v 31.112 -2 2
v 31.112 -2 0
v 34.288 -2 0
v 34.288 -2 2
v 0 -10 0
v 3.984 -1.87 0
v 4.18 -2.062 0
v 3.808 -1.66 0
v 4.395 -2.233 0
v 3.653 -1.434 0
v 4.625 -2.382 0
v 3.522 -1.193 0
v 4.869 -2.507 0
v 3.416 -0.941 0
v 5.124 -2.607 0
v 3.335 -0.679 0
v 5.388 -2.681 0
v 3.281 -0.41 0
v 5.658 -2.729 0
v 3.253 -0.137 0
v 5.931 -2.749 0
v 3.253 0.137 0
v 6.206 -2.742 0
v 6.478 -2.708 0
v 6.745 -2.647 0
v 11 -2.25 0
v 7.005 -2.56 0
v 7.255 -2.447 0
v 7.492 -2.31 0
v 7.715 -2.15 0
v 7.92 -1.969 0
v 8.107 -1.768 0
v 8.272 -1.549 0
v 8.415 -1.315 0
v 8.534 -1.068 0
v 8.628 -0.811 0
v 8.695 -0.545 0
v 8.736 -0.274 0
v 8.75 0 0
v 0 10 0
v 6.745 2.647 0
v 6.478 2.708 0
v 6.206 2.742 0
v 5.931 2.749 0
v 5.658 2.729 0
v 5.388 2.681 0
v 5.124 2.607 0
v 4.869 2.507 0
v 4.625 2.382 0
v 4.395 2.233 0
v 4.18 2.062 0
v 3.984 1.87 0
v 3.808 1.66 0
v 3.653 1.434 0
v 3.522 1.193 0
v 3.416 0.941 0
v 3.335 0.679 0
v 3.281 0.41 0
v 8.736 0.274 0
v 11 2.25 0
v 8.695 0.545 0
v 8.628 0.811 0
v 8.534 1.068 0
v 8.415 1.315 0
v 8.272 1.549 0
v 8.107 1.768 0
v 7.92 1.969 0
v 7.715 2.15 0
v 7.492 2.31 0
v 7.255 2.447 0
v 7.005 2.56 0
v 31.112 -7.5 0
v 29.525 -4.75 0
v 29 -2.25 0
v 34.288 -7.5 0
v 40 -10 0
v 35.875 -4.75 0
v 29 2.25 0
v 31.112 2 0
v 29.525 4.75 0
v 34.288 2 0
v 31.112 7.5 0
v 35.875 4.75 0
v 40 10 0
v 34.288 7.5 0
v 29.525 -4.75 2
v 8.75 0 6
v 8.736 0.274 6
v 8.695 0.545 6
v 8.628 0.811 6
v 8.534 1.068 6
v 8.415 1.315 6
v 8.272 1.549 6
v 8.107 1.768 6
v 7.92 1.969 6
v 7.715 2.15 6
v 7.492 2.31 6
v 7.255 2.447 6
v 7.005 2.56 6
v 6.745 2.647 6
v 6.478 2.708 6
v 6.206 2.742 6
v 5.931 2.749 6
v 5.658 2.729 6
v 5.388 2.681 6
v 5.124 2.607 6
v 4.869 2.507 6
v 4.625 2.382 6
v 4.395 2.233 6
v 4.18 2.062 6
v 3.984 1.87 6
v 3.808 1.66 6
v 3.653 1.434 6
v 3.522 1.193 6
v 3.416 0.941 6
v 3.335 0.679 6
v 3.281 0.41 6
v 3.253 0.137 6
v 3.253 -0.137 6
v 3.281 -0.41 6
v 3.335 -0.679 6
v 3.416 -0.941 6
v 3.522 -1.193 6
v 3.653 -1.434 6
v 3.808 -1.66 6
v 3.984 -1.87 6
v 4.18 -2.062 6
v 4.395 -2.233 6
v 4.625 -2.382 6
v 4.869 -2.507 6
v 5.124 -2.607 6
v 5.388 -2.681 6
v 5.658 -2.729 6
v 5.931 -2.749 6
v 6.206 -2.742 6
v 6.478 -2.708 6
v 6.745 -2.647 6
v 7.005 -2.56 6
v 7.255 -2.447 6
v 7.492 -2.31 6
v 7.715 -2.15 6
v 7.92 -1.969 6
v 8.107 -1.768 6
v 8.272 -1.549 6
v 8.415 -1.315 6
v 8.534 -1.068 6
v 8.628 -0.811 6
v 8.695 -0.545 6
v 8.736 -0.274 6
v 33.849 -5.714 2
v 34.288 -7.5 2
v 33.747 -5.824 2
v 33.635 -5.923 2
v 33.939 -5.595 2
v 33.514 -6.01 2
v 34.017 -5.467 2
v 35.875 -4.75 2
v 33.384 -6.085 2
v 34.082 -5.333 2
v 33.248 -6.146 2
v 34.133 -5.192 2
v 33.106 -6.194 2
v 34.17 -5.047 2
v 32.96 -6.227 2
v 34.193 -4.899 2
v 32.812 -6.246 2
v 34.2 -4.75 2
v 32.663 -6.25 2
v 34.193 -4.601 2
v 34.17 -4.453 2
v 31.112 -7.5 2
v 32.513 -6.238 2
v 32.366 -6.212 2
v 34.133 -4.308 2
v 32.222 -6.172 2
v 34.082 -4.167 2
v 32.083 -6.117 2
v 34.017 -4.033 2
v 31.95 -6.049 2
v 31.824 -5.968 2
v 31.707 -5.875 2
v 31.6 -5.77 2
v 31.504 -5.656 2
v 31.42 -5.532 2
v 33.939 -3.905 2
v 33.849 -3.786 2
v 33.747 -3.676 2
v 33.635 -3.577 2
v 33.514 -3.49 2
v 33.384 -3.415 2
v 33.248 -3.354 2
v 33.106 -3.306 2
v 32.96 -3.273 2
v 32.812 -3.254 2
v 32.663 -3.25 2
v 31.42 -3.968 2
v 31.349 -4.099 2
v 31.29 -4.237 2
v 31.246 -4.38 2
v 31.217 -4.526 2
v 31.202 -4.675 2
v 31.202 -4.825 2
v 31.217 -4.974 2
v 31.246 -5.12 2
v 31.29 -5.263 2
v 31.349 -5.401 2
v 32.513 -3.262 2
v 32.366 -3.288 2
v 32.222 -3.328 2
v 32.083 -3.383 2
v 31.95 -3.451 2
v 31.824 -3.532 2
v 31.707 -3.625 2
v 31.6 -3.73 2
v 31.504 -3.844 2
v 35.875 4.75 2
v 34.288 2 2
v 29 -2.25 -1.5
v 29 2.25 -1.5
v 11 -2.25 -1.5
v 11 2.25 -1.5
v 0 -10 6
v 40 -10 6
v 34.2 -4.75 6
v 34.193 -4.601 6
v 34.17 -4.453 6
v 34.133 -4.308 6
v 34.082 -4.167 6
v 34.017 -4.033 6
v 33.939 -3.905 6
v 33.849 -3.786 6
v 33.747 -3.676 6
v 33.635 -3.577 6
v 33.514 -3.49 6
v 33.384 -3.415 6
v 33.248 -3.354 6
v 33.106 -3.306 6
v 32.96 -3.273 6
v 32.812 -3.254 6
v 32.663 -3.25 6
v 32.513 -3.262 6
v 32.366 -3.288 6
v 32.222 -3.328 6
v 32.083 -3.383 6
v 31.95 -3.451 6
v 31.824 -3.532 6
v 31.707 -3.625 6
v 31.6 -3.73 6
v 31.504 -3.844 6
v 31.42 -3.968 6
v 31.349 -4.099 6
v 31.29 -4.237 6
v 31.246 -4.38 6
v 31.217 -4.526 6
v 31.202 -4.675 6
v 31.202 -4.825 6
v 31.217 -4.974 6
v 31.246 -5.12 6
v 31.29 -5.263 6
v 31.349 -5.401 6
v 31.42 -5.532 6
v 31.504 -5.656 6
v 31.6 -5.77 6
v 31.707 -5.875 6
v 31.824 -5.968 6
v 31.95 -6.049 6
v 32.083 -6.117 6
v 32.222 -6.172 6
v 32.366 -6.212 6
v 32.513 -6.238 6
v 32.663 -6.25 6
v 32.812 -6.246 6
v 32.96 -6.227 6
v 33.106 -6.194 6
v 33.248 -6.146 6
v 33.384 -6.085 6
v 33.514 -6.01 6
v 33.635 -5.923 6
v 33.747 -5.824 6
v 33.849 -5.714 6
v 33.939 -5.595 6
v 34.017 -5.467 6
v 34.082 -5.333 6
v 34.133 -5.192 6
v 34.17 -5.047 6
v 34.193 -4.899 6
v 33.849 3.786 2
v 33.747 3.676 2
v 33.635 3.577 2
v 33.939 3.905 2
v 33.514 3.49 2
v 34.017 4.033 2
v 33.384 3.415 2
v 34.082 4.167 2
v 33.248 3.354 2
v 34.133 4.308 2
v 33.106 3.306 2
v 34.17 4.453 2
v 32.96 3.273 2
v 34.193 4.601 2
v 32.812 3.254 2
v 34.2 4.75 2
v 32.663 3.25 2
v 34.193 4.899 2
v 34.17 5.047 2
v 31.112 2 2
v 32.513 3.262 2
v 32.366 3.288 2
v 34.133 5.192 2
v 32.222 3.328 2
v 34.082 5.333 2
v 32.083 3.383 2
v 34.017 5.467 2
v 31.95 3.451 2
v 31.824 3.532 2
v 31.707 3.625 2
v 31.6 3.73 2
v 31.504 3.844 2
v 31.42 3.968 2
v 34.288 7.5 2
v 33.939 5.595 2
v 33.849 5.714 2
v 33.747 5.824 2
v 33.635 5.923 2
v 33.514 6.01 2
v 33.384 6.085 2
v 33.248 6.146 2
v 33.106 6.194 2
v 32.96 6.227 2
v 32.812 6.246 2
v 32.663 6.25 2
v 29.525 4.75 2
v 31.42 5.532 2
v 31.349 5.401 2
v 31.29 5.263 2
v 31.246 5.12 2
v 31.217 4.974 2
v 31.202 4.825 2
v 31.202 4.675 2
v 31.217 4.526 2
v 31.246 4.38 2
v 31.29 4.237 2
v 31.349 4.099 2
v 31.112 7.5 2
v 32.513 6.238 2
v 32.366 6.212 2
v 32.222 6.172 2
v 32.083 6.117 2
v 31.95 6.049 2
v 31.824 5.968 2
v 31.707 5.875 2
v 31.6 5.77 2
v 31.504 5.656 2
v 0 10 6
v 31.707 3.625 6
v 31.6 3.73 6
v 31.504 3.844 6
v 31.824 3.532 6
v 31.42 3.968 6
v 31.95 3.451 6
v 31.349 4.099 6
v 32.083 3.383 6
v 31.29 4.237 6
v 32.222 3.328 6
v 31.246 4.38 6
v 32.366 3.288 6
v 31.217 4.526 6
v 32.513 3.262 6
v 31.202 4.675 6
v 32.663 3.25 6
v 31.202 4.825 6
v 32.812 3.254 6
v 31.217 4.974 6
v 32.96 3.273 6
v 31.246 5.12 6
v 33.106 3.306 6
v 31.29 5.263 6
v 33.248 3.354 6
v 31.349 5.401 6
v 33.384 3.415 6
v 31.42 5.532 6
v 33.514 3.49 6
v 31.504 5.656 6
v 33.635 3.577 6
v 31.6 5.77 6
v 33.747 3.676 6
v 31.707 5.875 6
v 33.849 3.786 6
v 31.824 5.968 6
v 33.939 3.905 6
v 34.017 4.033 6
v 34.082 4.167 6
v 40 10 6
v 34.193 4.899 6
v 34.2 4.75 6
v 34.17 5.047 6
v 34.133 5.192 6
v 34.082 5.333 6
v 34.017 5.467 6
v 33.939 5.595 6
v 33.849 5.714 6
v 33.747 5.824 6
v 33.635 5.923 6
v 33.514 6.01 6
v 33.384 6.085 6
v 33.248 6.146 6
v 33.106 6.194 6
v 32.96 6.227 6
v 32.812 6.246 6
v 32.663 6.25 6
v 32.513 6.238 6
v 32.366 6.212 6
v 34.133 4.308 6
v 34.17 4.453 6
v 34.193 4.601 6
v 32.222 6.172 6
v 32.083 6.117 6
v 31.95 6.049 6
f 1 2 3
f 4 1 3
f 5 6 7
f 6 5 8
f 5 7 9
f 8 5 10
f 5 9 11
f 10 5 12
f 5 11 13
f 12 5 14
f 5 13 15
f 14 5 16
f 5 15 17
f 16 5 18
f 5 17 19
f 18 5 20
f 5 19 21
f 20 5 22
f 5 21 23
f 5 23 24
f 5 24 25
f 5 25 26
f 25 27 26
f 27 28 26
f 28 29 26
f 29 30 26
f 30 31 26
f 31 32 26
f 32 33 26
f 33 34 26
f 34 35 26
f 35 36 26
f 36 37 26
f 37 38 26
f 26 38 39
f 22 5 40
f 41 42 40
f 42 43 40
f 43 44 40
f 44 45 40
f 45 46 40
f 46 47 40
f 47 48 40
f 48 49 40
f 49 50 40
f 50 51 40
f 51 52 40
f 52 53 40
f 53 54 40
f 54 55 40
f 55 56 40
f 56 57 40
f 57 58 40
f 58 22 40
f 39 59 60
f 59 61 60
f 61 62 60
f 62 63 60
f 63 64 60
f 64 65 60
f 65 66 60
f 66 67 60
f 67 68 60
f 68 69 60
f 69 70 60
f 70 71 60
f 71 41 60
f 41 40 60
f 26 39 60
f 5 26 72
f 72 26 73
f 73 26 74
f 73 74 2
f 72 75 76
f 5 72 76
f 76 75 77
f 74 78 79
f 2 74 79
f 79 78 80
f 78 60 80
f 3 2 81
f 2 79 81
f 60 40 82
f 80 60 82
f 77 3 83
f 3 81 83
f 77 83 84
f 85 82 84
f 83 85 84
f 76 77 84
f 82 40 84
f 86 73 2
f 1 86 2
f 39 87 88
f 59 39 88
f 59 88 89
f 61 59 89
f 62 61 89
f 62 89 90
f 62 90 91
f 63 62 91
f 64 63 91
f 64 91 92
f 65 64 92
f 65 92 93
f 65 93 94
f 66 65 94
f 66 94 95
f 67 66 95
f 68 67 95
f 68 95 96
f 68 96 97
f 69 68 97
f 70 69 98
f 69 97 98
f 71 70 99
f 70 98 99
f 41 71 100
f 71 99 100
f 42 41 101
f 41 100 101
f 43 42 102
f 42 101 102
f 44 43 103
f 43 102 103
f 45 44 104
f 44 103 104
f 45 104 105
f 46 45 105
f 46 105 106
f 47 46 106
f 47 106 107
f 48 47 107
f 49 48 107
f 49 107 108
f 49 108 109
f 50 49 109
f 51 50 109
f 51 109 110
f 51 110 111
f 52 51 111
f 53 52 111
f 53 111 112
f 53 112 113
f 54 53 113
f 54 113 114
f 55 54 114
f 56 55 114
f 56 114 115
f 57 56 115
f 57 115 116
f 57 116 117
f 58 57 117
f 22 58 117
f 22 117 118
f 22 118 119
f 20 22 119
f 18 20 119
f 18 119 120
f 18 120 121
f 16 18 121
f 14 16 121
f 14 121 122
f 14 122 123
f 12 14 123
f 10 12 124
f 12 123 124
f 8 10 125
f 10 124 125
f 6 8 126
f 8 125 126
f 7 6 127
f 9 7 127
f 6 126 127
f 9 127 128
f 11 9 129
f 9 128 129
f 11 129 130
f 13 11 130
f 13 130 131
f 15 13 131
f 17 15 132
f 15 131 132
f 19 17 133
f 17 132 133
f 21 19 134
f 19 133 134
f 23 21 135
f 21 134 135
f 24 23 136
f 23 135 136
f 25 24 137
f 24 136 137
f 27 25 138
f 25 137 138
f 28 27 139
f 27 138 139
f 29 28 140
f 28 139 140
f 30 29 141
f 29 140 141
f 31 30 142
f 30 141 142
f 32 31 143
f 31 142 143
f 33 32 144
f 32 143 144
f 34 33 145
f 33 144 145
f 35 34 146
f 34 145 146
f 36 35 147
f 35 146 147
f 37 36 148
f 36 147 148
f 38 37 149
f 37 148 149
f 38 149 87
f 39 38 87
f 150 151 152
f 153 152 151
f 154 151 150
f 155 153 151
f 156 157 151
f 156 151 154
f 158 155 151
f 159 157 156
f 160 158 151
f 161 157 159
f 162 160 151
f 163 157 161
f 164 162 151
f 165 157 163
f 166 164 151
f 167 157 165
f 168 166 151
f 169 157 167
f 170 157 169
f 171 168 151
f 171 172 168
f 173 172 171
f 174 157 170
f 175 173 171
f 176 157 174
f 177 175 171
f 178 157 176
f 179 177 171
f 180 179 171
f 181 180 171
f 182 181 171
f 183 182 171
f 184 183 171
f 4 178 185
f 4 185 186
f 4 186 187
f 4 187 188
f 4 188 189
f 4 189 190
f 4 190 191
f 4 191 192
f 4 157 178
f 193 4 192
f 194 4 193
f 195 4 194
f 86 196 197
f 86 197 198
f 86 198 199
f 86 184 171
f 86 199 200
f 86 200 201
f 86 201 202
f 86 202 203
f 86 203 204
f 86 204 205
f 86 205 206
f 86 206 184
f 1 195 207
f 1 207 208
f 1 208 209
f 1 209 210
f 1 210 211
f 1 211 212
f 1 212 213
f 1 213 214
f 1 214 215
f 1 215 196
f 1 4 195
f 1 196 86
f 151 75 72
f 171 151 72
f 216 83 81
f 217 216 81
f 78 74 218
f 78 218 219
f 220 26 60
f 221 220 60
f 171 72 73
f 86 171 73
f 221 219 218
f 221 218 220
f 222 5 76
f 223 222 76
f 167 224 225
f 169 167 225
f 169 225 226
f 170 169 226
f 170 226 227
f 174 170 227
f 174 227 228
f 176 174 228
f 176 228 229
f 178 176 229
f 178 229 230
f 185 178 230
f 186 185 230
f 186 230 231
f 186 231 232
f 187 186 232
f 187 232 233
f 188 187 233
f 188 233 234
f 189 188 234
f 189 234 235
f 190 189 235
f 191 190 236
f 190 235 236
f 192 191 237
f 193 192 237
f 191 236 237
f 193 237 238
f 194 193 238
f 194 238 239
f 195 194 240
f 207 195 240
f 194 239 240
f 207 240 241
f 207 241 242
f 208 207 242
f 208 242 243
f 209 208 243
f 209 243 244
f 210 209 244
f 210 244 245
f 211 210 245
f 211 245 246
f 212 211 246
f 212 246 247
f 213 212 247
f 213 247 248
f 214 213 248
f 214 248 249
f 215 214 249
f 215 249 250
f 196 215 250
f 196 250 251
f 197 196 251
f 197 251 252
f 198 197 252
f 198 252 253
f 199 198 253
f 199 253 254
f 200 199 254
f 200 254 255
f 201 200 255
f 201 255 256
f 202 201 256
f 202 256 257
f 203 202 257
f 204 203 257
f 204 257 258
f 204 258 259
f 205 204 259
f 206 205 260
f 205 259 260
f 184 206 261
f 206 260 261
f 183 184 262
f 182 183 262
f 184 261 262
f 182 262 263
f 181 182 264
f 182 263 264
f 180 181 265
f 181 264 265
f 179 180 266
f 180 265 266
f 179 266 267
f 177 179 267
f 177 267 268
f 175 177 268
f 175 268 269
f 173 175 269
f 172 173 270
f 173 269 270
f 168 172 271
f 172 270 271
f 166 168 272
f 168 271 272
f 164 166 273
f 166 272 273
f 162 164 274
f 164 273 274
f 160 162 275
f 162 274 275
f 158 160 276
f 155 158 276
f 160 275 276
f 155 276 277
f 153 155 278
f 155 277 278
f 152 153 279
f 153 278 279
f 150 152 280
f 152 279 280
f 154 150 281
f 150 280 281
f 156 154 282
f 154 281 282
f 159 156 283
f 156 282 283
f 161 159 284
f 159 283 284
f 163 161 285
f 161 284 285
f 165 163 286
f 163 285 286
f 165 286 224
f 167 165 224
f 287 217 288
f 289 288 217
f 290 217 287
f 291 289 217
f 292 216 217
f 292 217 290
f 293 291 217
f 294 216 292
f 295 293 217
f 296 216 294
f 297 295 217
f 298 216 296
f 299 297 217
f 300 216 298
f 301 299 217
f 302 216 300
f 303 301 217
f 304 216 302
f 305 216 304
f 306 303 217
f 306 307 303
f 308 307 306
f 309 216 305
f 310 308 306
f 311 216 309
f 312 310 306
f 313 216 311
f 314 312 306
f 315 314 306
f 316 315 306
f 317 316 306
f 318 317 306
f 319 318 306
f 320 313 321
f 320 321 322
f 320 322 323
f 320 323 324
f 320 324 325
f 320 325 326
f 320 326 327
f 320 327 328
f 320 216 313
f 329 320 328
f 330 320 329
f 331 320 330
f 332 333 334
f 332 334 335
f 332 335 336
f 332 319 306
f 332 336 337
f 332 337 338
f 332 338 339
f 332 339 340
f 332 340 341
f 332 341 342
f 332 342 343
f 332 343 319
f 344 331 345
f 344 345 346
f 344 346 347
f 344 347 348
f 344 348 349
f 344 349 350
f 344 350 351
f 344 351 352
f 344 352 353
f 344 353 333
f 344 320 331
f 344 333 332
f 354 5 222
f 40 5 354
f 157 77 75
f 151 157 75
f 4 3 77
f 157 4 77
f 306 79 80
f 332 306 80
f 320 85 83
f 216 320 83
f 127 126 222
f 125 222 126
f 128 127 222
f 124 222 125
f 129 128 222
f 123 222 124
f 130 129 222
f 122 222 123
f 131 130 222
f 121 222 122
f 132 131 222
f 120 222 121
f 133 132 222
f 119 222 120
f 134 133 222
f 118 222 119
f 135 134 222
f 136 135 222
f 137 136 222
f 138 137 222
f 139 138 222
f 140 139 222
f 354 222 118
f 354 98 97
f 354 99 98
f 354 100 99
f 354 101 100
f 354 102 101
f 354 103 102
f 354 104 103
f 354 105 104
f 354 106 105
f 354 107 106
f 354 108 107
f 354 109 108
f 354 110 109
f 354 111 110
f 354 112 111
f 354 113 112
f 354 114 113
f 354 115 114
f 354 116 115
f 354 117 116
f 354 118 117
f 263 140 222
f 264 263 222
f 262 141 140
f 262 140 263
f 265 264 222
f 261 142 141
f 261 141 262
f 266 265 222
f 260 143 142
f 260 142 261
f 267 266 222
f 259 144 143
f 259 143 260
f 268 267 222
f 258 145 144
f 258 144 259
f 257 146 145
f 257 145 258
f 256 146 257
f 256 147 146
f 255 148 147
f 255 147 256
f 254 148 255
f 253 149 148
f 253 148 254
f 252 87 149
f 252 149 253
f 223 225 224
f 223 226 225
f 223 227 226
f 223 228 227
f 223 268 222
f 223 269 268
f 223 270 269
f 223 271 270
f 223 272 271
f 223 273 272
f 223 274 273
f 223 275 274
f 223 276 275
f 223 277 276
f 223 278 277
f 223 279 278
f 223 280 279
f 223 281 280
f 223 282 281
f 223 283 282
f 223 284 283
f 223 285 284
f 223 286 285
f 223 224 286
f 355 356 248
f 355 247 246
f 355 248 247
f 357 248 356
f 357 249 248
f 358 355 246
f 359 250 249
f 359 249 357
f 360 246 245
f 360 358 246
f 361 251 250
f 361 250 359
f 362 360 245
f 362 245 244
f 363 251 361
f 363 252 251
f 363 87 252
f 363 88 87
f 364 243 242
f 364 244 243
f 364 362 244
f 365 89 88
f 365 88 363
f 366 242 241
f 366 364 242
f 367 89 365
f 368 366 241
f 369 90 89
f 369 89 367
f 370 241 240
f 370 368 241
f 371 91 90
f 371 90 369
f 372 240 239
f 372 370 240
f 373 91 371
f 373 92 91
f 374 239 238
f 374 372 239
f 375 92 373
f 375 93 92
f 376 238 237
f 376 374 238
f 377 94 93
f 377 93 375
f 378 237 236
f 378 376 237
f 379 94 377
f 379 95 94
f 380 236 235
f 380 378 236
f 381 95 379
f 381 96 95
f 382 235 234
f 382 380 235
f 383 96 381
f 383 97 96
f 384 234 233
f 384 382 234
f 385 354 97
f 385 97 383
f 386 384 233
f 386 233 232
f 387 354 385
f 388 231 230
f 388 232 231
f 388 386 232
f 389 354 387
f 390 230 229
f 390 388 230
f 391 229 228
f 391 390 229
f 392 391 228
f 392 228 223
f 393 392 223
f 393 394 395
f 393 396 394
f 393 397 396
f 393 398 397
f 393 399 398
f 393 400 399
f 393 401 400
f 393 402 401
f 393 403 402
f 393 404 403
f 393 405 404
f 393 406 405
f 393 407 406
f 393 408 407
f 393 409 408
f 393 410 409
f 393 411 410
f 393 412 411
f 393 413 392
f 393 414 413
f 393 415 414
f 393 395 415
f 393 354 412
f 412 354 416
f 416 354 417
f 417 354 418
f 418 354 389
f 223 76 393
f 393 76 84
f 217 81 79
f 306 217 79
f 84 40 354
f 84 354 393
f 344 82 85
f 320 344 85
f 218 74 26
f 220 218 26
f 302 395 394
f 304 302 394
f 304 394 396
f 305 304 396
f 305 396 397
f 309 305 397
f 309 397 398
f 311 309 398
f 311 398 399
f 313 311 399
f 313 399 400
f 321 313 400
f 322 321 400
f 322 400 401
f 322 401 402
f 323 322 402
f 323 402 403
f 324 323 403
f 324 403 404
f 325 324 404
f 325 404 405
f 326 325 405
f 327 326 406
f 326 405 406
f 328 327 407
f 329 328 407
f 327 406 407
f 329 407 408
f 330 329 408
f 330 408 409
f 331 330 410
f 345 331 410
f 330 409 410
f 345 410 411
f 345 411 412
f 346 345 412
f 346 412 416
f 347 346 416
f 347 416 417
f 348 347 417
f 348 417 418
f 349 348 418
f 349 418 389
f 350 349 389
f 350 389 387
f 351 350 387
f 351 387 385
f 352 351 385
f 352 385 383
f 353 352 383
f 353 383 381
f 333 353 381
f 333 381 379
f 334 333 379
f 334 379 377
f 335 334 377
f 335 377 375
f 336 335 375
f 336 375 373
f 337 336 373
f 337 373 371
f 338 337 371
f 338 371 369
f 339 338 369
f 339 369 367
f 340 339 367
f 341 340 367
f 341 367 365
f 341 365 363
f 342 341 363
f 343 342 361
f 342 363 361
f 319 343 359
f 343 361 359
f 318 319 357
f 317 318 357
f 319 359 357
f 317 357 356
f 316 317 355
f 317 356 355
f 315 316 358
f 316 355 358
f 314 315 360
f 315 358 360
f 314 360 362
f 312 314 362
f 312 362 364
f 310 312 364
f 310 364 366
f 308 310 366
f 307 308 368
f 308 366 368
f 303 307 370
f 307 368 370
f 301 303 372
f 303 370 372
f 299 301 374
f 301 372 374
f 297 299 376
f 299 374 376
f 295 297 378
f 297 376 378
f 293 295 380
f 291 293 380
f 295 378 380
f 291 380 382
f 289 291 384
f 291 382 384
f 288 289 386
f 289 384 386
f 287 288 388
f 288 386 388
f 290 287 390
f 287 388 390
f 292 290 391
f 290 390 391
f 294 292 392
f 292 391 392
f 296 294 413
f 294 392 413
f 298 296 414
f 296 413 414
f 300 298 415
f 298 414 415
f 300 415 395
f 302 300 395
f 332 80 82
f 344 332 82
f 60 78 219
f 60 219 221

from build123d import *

# Parameters (mm, degrees)
CROQUIS1_W              = 40
CROQUIS1_H              = 20
SALIENTE_EXTRUIR1_DEPTH = 6
CROQUIS2_W              = 18
CROQUIS2_H              = 4.5
SALIENTE_EXTRUIR2_DEPTH = 1.5
CROQUIS3_R              = 2.75
CORTAR_EXTRUIR1_DEPTH   = 8.5
CROQUIS4_R              = 1.5
CORTAR_EXTRUIR2_DEPTH   = 8.5
CORTAR_EXTRUIR3_DEPTH   = 2


with BuildPart() as part:
    # Croquis1 → Saliente-Extruir1 (new body)
    with BuildSketch(Plane.XY):
        with Locations((20, 0)):
            Rectangle(CROQUIS1_W, CROQUIS1_H)
    extrude(amount=SALIENTE_EXTRUIR1_DEPTH)

    # Croquis2 → Saliente-Extruir2 (add)
    with BuildSketch(Plane(origin=(0, 0, 0), x_dir=(-1, 0, 0), z_dir=(0, 0, -1))):
        with Locations((-20, 0)):
            Rectangle(CROQUIS2_W, CROQUIS2_H)
    extrude(amount=SALIENTE_EXTRUIR2_DEPTH)

    # Croquis3 → Cortar-Extruir1 (cut, through all)
    with BuildSketch(Plane.XY.offset(6)):
        with Locations((6, 0)):
            Circle(CROQUIS3_R)
    extrude(amount=-CORTAR_EXTRUIR1_DEPTH, mode=Mode.SUBTRACT)

    # Croquis4 → Cortar-Extruir2 (cut, through all)
    with BuildSketch(Plane.XY.offset(6)):
        with Locations((32.7, 4.75)):
            Circle(CROQUIS4_R)
        with Locations((32.7, -4.75)):
            Circle(CROQUIS4_R)
    extrude(amount=-CORTAR_EXTRUIR2_DEPTH, mode=Mode.SUBTRACT)

    # Croquis5 → Cortar-Extruir3 (cut)
    with BuildSketch(Plane(origin=(0, 0, 0), x_dir=(-1, 0, 0), z_dir=(0, 0, -1))):
        Polygon((-29.524573519, 4.75), (-31.11228676, 7.5), (-34.28771324, 7.5), (-35.875426481, 4.75), (-34.28771324, 2), (-31.11228676, 2), align=None)
        Polygon((-29.524573519, -4.75), (-31.11228676, -2), (-34.28771324, -2), (-35.875426481, -4.75), (-34.28771324, -7.5), (-31.11228676, -7.5), align=None)
    extrude(amount=-CORTAR_EXTRUIR3_DEPTH, mode=Mode.SUBTRACT)


solid = part.part
